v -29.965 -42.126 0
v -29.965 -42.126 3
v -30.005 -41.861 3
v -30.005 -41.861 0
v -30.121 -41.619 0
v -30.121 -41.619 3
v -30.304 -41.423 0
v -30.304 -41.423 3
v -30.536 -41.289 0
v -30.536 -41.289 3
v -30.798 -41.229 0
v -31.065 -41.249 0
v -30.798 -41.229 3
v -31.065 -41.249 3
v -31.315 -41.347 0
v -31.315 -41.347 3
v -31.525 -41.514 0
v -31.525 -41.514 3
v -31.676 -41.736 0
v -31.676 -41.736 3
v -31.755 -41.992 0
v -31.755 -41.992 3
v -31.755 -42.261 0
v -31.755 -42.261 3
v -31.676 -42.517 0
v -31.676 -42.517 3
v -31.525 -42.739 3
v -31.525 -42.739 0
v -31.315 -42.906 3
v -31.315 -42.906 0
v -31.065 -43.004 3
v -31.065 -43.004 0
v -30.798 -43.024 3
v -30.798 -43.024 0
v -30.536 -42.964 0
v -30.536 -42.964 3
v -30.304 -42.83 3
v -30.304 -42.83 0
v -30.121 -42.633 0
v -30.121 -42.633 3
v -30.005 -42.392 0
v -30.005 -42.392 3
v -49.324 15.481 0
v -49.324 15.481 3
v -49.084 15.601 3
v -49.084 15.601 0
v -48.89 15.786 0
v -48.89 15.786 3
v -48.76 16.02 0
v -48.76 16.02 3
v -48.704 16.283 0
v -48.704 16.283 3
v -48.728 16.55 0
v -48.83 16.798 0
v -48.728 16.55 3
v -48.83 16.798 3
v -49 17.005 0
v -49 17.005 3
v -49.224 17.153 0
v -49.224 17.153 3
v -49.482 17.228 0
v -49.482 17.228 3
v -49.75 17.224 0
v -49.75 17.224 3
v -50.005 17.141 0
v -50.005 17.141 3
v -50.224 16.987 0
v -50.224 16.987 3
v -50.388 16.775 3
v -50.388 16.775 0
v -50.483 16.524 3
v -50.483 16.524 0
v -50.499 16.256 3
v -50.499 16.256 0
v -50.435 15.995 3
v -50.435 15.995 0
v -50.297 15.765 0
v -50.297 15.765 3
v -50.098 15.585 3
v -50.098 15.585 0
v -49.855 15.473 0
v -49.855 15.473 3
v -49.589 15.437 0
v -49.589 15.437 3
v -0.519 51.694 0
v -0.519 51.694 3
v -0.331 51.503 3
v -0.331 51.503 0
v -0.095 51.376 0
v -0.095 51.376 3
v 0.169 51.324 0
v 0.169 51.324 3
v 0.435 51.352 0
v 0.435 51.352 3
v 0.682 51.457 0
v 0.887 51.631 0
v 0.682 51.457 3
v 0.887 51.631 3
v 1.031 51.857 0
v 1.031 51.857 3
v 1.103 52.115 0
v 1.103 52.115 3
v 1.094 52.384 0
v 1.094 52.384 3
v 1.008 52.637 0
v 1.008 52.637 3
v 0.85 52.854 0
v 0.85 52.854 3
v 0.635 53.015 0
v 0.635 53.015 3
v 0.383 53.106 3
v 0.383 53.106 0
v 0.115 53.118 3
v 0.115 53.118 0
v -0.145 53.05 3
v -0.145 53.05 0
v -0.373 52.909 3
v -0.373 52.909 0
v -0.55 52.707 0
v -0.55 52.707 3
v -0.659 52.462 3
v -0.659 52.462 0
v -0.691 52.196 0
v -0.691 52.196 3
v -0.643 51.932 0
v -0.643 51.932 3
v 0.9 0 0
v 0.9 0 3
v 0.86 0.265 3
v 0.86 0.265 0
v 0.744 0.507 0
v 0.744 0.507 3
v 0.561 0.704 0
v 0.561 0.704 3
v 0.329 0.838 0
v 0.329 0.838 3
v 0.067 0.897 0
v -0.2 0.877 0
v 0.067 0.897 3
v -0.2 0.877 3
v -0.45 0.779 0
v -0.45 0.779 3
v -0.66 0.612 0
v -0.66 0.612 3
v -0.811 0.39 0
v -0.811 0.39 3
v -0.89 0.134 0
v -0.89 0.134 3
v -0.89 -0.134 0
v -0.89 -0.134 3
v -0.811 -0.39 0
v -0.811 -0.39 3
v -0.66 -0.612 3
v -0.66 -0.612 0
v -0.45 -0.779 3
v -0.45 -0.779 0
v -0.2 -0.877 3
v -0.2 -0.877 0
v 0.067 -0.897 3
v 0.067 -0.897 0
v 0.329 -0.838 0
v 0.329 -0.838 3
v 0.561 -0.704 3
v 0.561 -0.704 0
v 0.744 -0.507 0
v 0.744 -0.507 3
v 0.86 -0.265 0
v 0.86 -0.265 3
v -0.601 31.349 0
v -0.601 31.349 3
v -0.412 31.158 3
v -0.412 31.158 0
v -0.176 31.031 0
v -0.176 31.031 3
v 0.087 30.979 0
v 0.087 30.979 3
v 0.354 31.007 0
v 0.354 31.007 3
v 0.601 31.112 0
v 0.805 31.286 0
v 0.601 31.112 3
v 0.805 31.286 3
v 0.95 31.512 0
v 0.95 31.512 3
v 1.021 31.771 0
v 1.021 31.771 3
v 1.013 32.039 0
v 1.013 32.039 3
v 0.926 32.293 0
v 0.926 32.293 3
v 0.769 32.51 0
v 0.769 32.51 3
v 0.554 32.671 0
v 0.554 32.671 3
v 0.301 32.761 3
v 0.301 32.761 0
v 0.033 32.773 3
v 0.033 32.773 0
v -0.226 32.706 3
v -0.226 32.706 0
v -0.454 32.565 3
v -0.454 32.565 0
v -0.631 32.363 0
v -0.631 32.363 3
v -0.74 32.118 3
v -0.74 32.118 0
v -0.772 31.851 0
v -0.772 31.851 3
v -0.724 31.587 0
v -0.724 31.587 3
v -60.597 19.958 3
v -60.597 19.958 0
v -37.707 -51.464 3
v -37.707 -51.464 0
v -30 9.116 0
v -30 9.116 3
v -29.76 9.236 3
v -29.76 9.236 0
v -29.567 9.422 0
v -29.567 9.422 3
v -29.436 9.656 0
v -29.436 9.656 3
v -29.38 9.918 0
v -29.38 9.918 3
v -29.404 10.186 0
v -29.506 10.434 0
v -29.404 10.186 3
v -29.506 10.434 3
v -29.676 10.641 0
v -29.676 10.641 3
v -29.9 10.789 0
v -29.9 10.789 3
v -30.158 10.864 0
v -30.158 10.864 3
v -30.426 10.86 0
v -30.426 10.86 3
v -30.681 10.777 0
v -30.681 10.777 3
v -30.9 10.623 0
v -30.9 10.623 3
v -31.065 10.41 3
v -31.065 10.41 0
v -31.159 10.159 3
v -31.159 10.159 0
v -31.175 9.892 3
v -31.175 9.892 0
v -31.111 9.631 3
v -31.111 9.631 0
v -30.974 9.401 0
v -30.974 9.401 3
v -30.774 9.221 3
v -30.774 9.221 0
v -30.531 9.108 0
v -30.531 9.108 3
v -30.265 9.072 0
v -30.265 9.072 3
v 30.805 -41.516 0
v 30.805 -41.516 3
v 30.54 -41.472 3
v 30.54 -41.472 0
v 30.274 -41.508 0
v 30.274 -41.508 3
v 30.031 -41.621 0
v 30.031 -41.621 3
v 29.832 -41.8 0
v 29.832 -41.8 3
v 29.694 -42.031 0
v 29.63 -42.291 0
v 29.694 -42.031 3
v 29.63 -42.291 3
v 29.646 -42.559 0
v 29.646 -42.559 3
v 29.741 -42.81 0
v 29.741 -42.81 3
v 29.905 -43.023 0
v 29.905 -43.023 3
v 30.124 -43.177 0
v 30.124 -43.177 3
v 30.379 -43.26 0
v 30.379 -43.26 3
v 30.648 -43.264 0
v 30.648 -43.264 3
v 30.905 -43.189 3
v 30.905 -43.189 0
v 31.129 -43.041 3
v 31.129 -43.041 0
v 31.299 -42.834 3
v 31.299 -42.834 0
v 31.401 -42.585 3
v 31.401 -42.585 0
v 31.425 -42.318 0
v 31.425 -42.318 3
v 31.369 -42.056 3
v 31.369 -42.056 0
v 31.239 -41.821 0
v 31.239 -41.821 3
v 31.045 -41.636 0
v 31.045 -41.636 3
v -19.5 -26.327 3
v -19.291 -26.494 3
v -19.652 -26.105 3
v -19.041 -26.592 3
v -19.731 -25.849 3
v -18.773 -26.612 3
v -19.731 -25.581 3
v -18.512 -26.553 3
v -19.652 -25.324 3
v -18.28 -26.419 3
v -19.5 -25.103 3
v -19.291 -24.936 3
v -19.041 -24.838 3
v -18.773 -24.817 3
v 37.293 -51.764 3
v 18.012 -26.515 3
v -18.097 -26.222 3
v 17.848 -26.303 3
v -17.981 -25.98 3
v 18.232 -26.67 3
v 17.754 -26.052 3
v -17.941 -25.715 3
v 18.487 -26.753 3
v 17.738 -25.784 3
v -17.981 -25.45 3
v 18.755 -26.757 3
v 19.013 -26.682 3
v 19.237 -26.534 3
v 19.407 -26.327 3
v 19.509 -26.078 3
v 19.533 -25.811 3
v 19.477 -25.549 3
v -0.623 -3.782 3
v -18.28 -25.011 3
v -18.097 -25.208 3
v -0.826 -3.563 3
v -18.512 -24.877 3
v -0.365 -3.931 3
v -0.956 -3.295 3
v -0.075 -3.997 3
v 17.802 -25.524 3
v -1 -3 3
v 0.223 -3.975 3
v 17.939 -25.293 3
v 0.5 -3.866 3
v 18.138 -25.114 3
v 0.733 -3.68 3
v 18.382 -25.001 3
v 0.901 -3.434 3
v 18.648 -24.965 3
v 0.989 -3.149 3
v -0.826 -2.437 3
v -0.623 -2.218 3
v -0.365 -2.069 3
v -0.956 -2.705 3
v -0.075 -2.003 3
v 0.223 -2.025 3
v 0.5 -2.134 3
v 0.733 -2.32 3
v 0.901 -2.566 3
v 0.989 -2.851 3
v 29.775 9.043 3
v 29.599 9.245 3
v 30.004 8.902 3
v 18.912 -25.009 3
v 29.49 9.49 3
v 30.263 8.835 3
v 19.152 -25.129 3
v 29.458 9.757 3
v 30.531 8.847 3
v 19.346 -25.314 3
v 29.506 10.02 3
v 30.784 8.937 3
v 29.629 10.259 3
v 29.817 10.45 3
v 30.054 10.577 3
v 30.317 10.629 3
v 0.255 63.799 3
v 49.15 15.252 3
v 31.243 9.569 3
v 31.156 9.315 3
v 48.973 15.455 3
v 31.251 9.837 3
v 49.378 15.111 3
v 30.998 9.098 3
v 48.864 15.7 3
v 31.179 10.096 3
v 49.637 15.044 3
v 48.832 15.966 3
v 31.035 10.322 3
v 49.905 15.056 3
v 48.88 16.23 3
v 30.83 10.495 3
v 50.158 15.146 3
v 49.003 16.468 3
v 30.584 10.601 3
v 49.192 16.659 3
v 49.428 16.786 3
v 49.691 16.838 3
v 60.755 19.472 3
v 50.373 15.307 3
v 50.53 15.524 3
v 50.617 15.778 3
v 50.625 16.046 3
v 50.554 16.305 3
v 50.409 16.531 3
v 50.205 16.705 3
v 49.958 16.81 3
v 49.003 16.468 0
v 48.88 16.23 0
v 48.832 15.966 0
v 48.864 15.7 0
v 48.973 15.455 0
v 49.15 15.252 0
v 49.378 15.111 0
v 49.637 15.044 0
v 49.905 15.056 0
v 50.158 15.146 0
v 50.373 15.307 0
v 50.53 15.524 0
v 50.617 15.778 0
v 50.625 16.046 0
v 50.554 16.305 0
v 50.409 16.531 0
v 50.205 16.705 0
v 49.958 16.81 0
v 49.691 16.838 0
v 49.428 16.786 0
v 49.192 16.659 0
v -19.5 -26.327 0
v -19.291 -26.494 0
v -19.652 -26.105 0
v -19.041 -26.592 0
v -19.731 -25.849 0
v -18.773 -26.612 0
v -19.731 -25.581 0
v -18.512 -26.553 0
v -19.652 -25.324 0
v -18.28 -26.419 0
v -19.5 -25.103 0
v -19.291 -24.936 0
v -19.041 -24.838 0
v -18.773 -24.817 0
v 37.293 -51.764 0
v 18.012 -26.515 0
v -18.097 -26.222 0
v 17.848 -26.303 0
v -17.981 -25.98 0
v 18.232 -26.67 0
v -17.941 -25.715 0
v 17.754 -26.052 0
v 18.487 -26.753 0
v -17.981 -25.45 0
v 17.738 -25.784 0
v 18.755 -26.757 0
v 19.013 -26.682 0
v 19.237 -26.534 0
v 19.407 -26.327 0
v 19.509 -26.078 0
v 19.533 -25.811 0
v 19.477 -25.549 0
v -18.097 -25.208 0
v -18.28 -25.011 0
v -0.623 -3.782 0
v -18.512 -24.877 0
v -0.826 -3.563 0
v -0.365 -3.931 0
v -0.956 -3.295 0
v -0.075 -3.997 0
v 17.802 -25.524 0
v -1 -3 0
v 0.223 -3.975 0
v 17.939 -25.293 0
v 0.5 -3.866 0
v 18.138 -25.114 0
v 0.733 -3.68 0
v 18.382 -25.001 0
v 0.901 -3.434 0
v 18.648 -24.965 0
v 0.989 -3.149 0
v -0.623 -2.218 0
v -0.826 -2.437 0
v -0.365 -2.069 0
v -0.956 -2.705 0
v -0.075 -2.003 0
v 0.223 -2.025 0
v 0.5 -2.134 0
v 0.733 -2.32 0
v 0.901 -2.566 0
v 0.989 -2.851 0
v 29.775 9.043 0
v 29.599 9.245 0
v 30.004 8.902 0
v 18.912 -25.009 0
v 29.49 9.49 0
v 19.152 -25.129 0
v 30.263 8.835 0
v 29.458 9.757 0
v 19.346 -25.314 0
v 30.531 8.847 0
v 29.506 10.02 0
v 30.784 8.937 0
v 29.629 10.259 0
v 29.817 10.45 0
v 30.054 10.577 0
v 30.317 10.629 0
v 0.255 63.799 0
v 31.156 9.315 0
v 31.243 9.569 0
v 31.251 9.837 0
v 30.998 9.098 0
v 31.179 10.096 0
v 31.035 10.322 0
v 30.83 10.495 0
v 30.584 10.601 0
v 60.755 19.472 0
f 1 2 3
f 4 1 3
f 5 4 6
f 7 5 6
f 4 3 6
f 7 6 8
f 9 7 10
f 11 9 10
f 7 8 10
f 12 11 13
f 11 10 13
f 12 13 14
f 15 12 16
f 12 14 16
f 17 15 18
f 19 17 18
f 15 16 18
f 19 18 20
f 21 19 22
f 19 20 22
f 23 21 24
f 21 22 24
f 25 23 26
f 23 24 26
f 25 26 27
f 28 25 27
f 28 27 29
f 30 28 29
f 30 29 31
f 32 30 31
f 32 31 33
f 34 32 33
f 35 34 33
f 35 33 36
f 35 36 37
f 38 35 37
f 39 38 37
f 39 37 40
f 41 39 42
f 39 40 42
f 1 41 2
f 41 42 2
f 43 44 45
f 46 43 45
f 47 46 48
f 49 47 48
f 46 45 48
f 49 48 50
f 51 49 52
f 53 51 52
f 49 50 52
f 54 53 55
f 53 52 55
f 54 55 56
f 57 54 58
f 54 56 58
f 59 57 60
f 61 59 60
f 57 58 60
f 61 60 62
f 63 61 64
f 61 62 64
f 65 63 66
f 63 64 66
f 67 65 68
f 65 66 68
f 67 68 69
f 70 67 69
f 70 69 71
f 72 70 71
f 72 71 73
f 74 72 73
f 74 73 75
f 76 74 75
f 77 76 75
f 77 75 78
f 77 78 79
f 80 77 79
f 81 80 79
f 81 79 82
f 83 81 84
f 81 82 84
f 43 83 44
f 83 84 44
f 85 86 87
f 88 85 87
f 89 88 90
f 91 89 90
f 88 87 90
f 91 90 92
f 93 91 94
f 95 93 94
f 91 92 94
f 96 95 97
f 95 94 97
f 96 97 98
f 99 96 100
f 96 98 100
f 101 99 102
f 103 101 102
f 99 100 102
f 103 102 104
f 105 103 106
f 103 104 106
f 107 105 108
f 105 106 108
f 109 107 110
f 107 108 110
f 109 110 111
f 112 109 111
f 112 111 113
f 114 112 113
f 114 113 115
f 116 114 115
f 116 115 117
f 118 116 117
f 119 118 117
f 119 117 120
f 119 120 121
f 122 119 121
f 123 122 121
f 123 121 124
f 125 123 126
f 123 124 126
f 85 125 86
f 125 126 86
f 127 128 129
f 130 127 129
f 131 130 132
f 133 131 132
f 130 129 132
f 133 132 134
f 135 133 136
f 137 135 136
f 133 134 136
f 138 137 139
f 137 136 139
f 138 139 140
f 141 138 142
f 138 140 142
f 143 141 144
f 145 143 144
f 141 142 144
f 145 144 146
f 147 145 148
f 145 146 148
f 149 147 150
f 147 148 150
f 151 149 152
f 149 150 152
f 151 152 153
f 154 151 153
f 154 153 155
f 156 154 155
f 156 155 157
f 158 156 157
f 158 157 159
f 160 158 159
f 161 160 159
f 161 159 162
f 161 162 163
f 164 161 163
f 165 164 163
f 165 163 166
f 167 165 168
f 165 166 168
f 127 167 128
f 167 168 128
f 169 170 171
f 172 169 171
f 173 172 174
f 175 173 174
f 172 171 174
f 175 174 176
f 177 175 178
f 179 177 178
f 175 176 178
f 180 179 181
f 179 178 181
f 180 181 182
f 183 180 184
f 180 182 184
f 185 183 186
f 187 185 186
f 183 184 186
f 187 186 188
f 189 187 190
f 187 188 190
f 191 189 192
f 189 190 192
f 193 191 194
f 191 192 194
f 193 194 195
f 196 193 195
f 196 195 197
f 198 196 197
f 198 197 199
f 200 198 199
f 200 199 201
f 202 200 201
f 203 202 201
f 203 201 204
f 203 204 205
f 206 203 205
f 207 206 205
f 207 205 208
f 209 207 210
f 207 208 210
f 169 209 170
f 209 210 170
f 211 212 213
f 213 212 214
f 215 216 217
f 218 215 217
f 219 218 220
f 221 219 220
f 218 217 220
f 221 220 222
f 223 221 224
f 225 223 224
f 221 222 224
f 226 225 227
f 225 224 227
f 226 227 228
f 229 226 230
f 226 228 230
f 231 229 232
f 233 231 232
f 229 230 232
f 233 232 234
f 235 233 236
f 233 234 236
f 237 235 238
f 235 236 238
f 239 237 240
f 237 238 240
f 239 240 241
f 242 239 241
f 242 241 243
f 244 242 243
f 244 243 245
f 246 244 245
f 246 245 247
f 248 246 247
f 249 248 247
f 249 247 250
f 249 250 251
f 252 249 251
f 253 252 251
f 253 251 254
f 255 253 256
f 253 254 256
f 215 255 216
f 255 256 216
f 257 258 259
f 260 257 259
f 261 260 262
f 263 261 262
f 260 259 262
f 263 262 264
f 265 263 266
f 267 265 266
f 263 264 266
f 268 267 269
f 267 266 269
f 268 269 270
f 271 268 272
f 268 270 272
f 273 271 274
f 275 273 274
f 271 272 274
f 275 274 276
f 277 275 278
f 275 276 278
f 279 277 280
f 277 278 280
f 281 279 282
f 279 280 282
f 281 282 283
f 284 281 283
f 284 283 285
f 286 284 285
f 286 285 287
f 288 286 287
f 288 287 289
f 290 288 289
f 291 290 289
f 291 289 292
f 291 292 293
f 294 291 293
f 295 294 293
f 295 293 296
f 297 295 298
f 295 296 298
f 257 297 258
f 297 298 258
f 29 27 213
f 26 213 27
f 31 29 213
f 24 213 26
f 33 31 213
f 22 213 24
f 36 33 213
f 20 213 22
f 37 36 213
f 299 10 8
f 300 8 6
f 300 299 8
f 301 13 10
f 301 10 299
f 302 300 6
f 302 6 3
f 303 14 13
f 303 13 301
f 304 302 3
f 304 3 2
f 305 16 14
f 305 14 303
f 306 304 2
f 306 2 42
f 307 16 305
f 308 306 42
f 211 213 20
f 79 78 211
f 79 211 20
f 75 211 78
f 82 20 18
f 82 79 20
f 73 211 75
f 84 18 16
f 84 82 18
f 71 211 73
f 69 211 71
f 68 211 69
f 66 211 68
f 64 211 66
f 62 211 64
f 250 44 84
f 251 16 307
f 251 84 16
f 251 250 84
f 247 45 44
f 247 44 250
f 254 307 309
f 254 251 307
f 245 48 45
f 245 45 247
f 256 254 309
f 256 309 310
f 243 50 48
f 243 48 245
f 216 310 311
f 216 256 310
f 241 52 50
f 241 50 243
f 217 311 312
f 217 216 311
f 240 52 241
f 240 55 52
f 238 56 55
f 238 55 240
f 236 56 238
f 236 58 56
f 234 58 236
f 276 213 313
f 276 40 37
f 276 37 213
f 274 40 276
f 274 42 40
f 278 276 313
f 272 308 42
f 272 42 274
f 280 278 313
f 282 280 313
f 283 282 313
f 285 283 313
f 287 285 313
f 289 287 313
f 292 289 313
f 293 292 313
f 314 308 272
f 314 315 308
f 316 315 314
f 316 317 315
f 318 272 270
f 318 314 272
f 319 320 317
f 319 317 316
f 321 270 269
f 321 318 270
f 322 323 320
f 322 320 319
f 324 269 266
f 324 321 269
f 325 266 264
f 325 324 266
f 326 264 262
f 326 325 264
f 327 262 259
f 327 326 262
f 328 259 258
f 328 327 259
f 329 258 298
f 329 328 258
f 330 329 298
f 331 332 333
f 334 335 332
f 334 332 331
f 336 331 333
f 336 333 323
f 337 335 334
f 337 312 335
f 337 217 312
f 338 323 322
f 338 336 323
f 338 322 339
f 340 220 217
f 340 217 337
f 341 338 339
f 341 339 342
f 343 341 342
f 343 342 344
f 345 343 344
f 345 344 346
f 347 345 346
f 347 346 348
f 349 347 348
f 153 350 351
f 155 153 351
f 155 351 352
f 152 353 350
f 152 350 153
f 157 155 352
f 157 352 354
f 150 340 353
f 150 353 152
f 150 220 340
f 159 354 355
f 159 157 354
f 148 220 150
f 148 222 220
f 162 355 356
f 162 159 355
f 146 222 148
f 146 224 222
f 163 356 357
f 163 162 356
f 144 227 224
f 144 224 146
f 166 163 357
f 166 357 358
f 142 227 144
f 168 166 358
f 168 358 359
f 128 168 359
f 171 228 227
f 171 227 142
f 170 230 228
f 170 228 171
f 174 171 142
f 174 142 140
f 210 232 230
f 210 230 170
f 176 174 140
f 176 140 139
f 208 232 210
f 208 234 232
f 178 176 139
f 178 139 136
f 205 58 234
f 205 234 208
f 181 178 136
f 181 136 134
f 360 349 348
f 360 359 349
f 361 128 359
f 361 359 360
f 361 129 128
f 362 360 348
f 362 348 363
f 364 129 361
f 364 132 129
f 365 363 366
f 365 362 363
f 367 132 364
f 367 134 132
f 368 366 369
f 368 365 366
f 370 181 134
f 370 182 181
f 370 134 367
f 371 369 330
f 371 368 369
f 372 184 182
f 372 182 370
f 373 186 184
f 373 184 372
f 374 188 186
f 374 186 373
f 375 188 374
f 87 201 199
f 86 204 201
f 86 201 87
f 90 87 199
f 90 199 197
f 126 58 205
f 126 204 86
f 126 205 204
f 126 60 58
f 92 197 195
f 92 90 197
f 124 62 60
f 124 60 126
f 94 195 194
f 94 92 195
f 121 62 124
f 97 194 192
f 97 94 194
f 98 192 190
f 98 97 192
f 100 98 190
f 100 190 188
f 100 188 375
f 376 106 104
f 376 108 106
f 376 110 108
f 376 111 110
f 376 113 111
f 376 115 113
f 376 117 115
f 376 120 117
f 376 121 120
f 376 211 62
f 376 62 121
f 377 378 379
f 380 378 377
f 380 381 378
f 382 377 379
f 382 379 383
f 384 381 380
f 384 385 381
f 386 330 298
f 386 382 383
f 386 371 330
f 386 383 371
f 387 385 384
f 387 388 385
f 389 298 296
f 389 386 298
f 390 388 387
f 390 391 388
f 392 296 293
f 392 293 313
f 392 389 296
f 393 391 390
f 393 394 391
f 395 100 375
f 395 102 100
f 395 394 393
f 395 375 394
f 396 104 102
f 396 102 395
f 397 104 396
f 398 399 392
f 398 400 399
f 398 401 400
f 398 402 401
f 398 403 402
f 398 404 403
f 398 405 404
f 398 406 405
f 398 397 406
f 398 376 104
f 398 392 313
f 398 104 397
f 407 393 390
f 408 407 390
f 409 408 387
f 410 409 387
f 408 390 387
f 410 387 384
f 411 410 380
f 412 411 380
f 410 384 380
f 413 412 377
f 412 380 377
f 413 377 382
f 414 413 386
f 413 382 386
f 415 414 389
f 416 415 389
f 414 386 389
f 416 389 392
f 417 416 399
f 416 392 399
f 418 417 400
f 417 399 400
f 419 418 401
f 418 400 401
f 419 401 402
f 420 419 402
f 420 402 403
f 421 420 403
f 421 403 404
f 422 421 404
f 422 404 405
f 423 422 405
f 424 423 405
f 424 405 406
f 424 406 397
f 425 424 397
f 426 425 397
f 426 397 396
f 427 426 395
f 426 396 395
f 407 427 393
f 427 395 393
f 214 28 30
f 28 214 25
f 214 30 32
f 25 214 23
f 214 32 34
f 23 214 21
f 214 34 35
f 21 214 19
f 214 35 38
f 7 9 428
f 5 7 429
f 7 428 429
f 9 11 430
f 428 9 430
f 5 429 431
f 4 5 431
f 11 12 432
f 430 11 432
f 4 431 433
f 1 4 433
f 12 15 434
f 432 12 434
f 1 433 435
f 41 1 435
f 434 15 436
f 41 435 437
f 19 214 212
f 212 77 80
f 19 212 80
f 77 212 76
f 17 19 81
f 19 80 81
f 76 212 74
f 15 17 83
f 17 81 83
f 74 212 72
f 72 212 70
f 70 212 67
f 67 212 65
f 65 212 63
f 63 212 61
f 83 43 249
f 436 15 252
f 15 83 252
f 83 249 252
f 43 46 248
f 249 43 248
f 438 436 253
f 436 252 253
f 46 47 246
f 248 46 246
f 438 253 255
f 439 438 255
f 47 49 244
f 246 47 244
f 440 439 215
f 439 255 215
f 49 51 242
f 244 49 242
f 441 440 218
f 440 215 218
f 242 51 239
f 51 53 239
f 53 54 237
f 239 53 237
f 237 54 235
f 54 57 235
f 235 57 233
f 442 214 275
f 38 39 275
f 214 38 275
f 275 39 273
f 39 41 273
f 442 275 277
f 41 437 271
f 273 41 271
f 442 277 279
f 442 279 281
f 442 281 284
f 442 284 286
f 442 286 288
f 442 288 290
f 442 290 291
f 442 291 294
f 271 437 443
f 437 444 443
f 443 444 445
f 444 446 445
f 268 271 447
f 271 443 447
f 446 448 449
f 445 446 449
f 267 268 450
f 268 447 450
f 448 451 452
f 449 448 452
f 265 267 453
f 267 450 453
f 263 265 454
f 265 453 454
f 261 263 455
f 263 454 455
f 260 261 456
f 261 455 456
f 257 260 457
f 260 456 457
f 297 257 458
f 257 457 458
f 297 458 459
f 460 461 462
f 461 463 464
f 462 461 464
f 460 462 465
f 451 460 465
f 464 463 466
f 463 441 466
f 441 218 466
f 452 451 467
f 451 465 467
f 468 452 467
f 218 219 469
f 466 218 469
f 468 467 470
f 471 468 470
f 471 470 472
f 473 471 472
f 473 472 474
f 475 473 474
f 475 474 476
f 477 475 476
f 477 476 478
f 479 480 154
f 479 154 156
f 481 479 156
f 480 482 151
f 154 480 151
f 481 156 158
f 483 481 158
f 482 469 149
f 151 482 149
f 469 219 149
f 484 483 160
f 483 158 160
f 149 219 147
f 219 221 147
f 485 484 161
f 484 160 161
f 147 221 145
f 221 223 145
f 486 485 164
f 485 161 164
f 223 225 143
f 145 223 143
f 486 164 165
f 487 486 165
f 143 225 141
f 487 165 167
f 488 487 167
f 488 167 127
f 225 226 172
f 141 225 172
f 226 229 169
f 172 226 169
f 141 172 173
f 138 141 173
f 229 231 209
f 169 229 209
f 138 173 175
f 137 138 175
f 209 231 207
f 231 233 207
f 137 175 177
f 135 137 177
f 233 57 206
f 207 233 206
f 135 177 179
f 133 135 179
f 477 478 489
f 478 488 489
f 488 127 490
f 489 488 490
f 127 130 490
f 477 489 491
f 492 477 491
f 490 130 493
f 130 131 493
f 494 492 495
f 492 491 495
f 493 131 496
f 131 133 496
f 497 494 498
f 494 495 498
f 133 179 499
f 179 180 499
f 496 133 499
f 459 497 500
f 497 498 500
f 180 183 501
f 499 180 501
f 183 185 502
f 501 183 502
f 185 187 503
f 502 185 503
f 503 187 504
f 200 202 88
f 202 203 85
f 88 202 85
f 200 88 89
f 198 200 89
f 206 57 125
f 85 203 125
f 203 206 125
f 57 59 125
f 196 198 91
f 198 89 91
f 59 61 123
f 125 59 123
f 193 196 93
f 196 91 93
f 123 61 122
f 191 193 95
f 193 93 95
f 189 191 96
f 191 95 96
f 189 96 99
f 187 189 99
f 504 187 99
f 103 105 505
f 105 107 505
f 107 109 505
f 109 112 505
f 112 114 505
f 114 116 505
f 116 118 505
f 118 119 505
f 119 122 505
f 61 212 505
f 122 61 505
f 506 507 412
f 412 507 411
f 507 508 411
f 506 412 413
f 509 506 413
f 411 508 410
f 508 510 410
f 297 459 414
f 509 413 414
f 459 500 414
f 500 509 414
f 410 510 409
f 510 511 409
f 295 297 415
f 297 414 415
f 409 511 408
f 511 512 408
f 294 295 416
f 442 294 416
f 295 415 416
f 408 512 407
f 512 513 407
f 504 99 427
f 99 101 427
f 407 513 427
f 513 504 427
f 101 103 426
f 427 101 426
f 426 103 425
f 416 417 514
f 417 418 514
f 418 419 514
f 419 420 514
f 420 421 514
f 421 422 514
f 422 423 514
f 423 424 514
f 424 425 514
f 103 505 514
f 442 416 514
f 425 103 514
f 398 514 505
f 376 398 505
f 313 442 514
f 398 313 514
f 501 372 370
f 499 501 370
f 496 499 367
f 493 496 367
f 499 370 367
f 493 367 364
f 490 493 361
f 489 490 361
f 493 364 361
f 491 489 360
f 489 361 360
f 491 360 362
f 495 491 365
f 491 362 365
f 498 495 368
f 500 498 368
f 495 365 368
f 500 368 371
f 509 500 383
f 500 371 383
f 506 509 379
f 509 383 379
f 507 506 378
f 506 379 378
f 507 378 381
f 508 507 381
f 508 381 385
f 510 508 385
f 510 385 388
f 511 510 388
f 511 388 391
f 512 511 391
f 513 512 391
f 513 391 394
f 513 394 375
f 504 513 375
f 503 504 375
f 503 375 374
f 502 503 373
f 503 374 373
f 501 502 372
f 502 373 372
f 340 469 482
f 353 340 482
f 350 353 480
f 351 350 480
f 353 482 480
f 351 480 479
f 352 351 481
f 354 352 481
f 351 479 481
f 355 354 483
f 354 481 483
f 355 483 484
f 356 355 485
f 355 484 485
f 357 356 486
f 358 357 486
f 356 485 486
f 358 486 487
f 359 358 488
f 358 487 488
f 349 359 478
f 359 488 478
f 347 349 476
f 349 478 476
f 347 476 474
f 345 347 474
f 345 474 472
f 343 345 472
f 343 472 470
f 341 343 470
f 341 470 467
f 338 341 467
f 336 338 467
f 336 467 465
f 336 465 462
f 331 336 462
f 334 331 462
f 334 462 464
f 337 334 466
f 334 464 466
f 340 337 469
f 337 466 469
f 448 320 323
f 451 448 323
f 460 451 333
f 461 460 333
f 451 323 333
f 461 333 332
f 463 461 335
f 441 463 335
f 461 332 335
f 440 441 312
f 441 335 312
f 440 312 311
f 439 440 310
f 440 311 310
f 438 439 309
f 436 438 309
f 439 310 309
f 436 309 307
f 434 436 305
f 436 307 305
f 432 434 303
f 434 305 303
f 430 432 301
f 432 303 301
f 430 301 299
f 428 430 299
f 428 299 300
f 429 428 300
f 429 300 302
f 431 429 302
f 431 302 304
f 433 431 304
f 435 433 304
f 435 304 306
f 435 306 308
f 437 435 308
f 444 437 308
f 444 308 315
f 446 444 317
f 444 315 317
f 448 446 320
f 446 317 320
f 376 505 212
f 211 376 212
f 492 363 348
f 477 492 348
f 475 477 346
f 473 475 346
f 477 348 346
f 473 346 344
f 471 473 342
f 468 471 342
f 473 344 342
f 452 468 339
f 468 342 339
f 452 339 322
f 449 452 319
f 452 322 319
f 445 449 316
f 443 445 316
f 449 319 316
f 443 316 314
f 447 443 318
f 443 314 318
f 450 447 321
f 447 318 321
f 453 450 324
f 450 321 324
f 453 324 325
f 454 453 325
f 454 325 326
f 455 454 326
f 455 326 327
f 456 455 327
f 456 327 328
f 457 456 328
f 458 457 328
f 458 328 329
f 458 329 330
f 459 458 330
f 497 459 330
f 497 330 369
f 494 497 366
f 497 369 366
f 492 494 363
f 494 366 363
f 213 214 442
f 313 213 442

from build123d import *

# Parameters (mm, degrees)
BOSS_EXTRUDE1_DEPTH = 3
SKETCH3_R           = 0.9
CUT_EXTRUDE1_DEPTH  = 3
SKETCH5_R           = 0.9
CUT_EXTRUDE2_DEPTH  = 3
CIRPATTERN1_COUNT   = 5
SKETCH6_R           = 1
CUT_EXTRUDE3_DEPTH  = 3


with BuildPart() as part:
    # Sketch1 → Boss-Extrude1 (new body)
    with BuildSketch(Plane.XY):
        Polygon((-37.706506674, -51.464286136), (37.293493326, -51.764357899), (60.755153109, 19.472153549), (0.255256287, 63.798810626), (-60.597396047, 19.95767986), align=None)
    extrude(amount=BOSS_EXTRUDE1_DEPTH)

    # Sketch3 → Cut-Extrude1 (cut)
    with BuildSketch(Plane.XY.offset(3)):
        Circle(SKETCH3_R)
    extrude(amount=-CUT_EXTRUDE1_DEPTH, mode=Mode.SUBTRACT)

    # Sketch5 → Cut-Extrude2 (cut)
    with BuildSketch(Plane.XY.offset(3)):
        with Locations((-30.864859889, -42.126362822)):
            Circle(SKETCH5_R)
        with Locations((-18.84066677, -25.714964105)):
            Circle(SKETCH5_R)
    cut_extrude2 = extrude(amount=-CUT_EXTRUDE2_DEPTH, mode=Mode.SUBTRACT)

    # CirPattern1: Cut-Extrude2 ×5 about axis
    cirpattern1_axis = Axis((0, 0, 0), (0, 0, 1))
    for i in range(1, CIRPATTERN1_COUNT):
        add(cut_extrude2.rotate(cirpattern1_axis, i * 360 / CIRPATTERN1_COUNT), mode=Mode.SUBTRACT)

    # Sketch6 → Cut-Extrude3 (cut)
    with BuildSketch(Plane(origin=(0, 0, 0), x_dir=(-1, 0, 0), z_dir=(0, 0, -1))):
        with Locations((0, -3)):
            Circle(SKETCH6_R)
    extrude(amount=-CUT_EXTRUDE3_DEPTH, mode=Mode.SUBTRACT)


solid = part.part
